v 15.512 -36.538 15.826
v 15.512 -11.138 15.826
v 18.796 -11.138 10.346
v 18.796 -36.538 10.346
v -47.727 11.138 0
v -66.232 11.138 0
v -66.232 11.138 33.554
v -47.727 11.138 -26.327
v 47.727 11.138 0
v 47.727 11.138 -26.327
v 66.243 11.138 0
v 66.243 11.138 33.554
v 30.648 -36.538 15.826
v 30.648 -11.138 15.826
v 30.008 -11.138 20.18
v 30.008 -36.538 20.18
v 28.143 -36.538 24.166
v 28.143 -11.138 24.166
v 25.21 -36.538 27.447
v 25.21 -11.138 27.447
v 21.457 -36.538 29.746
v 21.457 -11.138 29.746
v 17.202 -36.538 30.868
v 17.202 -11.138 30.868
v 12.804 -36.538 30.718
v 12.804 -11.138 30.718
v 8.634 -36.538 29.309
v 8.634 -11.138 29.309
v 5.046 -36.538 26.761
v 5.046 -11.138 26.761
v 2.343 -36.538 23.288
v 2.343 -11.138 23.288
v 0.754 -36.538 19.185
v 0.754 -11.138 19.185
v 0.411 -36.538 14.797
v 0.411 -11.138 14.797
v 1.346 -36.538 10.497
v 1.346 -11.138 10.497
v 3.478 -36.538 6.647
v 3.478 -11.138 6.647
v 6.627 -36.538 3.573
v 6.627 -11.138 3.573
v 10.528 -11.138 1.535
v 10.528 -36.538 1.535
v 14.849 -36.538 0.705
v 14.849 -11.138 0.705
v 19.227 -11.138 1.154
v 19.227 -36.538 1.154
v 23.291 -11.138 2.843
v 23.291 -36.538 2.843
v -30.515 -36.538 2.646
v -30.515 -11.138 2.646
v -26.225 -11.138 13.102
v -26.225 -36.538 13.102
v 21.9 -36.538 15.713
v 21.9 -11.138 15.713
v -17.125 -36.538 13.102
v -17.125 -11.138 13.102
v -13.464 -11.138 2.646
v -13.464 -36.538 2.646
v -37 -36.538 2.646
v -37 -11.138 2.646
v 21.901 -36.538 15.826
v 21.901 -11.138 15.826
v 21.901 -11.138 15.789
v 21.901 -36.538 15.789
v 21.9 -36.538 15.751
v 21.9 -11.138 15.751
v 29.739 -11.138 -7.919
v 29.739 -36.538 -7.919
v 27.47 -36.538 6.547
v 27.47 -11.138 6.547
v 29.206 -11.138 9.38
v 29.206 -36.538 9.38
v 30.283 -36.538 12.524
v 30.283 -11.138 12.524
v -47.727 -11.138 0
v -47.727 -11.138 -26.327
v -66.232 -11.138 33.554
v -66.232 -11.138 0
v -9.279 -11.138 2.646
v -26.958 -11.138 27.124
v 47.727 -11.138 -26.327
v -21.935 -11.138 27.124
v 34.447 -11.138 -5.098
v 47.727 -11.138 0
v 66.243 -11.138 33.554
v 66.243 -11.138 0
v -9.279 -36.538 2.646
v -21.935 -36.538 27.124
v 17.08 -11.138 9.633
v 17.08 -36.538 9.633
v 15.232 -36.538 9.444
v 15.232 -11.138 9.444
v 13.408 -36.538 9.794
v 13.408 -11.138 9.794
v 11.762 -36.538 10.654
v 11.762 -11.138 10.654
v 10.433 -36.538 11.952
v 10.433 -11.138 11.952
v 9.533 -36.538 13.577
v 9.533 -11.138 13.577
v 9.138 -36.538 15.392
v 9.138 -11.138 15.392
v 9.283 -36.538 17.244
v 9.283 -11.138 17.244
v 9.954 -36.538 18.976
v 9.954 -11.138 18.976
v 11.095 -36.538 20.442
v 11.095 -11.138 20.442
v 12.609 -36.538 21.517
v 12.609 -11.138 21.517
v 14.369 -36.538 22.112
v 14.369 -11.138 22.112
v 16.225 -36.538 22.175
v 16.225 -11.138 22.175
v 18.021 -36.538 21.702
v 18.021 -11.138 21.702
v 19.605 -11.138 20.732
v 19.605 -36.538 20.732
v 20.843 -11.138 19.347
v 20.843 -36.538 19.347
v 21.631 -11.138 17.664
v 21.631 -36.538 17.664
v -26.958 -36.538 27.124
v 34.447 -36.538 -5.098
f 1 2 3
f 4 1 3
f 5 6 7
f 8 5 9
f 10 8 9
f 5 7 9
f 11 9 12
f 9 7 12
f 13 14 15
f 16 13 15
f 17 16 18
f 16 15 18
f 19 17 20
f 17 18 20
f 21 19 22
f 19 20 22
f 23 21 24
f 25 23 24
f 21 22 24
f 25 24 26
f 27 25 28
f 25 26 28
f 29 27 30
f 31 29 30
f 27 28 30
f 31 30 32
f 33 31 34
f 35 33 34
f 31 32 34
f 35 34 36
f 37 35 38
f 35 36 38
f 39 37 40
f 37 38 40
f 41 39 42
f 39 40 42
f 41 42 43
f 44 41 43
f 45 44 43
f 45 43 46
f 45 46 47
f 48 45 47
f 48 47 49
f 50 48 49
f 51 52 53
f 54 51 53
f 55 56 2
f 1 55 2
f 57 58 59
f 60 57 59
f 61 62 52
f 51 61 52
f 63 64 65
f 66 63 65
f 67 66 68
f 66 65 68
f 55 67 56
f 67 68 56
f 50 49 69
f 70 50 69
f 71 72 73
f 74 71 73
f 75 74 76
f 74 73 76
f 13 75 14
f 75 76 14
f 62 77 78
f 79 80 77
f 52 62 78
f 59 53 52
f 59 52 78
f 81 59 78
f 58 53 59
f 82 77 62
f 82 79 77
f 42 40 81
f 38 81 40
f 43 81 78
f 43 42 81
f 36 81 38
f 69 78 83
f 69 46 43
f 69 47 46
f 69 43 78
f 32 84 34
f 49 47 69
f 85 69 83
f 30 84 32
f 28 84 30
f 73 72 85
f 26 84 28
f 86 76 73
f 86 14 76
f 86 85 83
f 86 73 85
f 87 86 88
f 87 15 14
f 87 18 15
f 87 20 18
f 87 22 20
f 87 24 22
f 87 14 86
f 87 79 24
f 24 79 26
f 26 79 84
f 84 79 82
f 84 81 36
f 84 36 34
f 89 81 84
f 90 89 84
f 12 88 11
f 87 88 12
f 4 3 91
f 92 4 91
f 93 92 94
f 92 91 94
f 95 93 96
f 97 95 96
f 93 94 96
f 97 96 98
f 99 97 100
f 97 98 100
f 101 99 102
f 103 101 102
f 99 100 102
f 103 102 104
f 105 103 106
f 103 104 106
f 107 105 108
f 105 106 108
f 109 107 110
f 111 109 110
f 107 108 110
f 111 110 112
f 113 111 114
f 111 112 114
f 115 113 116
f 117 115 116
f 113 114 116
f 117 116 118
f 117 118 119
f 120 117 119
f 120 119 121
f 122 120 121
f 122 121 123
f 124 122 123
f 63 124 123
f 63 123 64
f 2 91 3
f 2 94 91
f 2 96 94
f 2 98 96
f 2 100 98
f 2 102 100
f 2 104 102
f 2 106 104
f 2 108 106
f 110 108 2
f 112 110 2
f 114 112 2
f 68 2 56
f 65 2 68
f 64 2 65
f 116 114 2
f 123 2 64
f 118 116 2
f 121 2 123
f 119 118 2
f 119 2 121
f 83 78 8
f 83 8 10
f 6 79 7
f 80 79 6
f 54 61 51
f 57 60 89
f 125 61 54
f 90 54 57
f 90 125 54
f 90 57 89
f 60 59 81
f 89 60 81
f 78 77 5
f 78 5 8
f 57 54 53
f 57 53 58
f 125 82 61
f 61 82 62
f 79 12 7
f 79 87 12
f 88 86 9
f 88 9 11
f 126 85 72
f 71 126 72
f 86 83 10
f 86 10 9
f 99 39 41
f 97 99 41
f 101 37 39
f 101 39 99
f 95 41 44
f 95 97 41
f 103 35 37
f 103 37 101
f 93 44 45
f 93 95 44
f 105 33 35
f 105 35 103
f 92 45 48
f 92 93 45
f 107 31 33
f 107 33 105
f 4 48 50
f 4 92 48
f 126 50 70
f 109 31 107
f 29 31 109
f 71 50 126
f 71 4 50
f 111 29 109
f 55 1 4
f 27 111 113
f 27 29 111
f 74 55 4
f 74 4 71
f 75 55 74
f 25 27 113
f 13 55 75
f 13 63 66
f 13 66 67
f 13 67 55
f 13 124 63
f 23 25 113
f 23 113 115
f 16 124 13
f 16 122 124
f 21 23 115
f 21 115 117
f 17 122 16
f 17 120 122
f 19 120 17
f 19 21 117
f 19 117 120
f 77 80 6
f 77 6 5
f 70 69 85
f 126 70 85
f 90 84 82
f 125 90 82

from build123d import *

# Parameters (mm, degrees)
F1_DEPTH = 11.1375302076
F3_DEPTH = 25.4


# Not quite as in the source:
# - a feature names something its author has since deleted; it is built from what else it names


with BuildPart() as f1:
    # F0 (on Front) → F1 (new body, symmetric)
    with BuildSketch(Plane.XZ):
        Polygon((-47.7266, 0), (0, 0), (0, 33.5543528199), (-66.2321434704, 33.5543528199), (-66.2321434704, 0), align=None)
        Polygon((47.7266, 0), (0, 0), (0, -26.3268053532), (23.8633, -26.3268053532), (47.7266, -26.3268053532), align=None)
        Polygon((0, 33.5543528199), (0, 0), (47.7266, 0), (66.2432, 0), (66.2432, 33.5543528199), align=None)
        Polygon((0, -26.3268053532), (0, 0), (-47.7266, 0), (-47.7266, -26.3268053532), (-23.8633, -26.3268053532), align=None)
    extrude(amount=F1_DEPTH, both=True)

    # F2 (on face) → F3 (join)
    with BuildSketch(Plane.XZ.offset(11.1375302076)):
        Polygon((-21.9350446656, 23.558561476), (-26.957899332, 27.1239373833), (-37.0000749826, 2.6461503003), (-30.5145010352, 2.6461503003), (-26.2247728504, 13.1023558882), align=None)
        Polygon((-21.9350446656, 27.1239373833), (-26.957899332, 27.1239373833), (-21.9350446656, 23.558561476), (-17.1249434352, 13.1023558882), (-13.4637281299, 2.6461503003), (-9.2794969678, 2.6461503003), align=None)
        Polygon((-17.1249434352, 13.1023558882), (-21.9350446656, 23.558561476), (-26.2247728504, 13.1023558882), align=None)
        with BuildLine():
            ThreePointArc((21.8997799497, 15.7127540144), (21.0422650014, 12.6276476595), (18.7955158738, 10.3461281077))
            Line((18.7955158738, 10.3461281077), (23.2909736673, 2.8426809347))
            ThreePointArc((23.2909736673, 2.8426809347), (25.5526183138, 4.5004893654), (27.4696294265, 6.5470556834))
            Line((27.4696294265, 6.5470556834), (21.9791319159, 15.7113410392))
            Line((21.9791319159, 15.7113410392), (21.8997799497, 15.7127540144))
        make_face()
        with BuildLine():
            Line((23.2909736673, 2.8426809347), (18.7955158738, 10.3461281077))
            ThreePointArc((18.7955158738, 10.3461281077), (9.9537248959, 18.9759861326), (21.9007925331, 15.8264953643))
            ThreePointArc((21.9007925331, 15.8264953643), (21.9005393822, 15.7696224358), (21.8997799497, 15.7127540144))
            Line((21.8997799497, 15.7127540144), (21.9791319159, 15.7113410392))
            Line((21.9791319159, 15.7113410392), (27.4696294265, 6.5470556834))
            ThreePointArc((27.4696294265, 6.5470556834), (29.8312607656, 10.9221852492), (30.6478411926, 15.8264953643))
            ThreePointArc((30.6478411926, 15.8264953643), (2.3434407909, 23.2881127649), (23.2909736673, 2.8426809347))
        make_face()
        with BuildLine():
            ThreePointArc((27.4696294265, 6.5470556834), (25.5526183138, 4.5004893654), (23.2909736673, 2.8426809347))
            Line((23.2909736673, 2.8426809347), (29.7385305166, -7.9190488905))
            Line((29.7385305166, -7.9190488905), (34.4466119702, -5.0983478214))
            Line((34.4466119702, -5.0983478214), (27.4696294265, 6.5470556834))
        make_face()
        with BuildLine():
            Line((21.8997799497, 15.7127540144), (15.512123704, 15.8264953643))
            Line((15.512123704, 15.8264953643), (18.7955158738, 10.3461281077))
            ThreePointArc((18.7955158738, 10.3461281077), (21.0422650014, 12.6276476595), (21.8997799497, 15.7127540144))
        make_face()
    extrude(amount=F3_DEPTH)


solid = f1.part
